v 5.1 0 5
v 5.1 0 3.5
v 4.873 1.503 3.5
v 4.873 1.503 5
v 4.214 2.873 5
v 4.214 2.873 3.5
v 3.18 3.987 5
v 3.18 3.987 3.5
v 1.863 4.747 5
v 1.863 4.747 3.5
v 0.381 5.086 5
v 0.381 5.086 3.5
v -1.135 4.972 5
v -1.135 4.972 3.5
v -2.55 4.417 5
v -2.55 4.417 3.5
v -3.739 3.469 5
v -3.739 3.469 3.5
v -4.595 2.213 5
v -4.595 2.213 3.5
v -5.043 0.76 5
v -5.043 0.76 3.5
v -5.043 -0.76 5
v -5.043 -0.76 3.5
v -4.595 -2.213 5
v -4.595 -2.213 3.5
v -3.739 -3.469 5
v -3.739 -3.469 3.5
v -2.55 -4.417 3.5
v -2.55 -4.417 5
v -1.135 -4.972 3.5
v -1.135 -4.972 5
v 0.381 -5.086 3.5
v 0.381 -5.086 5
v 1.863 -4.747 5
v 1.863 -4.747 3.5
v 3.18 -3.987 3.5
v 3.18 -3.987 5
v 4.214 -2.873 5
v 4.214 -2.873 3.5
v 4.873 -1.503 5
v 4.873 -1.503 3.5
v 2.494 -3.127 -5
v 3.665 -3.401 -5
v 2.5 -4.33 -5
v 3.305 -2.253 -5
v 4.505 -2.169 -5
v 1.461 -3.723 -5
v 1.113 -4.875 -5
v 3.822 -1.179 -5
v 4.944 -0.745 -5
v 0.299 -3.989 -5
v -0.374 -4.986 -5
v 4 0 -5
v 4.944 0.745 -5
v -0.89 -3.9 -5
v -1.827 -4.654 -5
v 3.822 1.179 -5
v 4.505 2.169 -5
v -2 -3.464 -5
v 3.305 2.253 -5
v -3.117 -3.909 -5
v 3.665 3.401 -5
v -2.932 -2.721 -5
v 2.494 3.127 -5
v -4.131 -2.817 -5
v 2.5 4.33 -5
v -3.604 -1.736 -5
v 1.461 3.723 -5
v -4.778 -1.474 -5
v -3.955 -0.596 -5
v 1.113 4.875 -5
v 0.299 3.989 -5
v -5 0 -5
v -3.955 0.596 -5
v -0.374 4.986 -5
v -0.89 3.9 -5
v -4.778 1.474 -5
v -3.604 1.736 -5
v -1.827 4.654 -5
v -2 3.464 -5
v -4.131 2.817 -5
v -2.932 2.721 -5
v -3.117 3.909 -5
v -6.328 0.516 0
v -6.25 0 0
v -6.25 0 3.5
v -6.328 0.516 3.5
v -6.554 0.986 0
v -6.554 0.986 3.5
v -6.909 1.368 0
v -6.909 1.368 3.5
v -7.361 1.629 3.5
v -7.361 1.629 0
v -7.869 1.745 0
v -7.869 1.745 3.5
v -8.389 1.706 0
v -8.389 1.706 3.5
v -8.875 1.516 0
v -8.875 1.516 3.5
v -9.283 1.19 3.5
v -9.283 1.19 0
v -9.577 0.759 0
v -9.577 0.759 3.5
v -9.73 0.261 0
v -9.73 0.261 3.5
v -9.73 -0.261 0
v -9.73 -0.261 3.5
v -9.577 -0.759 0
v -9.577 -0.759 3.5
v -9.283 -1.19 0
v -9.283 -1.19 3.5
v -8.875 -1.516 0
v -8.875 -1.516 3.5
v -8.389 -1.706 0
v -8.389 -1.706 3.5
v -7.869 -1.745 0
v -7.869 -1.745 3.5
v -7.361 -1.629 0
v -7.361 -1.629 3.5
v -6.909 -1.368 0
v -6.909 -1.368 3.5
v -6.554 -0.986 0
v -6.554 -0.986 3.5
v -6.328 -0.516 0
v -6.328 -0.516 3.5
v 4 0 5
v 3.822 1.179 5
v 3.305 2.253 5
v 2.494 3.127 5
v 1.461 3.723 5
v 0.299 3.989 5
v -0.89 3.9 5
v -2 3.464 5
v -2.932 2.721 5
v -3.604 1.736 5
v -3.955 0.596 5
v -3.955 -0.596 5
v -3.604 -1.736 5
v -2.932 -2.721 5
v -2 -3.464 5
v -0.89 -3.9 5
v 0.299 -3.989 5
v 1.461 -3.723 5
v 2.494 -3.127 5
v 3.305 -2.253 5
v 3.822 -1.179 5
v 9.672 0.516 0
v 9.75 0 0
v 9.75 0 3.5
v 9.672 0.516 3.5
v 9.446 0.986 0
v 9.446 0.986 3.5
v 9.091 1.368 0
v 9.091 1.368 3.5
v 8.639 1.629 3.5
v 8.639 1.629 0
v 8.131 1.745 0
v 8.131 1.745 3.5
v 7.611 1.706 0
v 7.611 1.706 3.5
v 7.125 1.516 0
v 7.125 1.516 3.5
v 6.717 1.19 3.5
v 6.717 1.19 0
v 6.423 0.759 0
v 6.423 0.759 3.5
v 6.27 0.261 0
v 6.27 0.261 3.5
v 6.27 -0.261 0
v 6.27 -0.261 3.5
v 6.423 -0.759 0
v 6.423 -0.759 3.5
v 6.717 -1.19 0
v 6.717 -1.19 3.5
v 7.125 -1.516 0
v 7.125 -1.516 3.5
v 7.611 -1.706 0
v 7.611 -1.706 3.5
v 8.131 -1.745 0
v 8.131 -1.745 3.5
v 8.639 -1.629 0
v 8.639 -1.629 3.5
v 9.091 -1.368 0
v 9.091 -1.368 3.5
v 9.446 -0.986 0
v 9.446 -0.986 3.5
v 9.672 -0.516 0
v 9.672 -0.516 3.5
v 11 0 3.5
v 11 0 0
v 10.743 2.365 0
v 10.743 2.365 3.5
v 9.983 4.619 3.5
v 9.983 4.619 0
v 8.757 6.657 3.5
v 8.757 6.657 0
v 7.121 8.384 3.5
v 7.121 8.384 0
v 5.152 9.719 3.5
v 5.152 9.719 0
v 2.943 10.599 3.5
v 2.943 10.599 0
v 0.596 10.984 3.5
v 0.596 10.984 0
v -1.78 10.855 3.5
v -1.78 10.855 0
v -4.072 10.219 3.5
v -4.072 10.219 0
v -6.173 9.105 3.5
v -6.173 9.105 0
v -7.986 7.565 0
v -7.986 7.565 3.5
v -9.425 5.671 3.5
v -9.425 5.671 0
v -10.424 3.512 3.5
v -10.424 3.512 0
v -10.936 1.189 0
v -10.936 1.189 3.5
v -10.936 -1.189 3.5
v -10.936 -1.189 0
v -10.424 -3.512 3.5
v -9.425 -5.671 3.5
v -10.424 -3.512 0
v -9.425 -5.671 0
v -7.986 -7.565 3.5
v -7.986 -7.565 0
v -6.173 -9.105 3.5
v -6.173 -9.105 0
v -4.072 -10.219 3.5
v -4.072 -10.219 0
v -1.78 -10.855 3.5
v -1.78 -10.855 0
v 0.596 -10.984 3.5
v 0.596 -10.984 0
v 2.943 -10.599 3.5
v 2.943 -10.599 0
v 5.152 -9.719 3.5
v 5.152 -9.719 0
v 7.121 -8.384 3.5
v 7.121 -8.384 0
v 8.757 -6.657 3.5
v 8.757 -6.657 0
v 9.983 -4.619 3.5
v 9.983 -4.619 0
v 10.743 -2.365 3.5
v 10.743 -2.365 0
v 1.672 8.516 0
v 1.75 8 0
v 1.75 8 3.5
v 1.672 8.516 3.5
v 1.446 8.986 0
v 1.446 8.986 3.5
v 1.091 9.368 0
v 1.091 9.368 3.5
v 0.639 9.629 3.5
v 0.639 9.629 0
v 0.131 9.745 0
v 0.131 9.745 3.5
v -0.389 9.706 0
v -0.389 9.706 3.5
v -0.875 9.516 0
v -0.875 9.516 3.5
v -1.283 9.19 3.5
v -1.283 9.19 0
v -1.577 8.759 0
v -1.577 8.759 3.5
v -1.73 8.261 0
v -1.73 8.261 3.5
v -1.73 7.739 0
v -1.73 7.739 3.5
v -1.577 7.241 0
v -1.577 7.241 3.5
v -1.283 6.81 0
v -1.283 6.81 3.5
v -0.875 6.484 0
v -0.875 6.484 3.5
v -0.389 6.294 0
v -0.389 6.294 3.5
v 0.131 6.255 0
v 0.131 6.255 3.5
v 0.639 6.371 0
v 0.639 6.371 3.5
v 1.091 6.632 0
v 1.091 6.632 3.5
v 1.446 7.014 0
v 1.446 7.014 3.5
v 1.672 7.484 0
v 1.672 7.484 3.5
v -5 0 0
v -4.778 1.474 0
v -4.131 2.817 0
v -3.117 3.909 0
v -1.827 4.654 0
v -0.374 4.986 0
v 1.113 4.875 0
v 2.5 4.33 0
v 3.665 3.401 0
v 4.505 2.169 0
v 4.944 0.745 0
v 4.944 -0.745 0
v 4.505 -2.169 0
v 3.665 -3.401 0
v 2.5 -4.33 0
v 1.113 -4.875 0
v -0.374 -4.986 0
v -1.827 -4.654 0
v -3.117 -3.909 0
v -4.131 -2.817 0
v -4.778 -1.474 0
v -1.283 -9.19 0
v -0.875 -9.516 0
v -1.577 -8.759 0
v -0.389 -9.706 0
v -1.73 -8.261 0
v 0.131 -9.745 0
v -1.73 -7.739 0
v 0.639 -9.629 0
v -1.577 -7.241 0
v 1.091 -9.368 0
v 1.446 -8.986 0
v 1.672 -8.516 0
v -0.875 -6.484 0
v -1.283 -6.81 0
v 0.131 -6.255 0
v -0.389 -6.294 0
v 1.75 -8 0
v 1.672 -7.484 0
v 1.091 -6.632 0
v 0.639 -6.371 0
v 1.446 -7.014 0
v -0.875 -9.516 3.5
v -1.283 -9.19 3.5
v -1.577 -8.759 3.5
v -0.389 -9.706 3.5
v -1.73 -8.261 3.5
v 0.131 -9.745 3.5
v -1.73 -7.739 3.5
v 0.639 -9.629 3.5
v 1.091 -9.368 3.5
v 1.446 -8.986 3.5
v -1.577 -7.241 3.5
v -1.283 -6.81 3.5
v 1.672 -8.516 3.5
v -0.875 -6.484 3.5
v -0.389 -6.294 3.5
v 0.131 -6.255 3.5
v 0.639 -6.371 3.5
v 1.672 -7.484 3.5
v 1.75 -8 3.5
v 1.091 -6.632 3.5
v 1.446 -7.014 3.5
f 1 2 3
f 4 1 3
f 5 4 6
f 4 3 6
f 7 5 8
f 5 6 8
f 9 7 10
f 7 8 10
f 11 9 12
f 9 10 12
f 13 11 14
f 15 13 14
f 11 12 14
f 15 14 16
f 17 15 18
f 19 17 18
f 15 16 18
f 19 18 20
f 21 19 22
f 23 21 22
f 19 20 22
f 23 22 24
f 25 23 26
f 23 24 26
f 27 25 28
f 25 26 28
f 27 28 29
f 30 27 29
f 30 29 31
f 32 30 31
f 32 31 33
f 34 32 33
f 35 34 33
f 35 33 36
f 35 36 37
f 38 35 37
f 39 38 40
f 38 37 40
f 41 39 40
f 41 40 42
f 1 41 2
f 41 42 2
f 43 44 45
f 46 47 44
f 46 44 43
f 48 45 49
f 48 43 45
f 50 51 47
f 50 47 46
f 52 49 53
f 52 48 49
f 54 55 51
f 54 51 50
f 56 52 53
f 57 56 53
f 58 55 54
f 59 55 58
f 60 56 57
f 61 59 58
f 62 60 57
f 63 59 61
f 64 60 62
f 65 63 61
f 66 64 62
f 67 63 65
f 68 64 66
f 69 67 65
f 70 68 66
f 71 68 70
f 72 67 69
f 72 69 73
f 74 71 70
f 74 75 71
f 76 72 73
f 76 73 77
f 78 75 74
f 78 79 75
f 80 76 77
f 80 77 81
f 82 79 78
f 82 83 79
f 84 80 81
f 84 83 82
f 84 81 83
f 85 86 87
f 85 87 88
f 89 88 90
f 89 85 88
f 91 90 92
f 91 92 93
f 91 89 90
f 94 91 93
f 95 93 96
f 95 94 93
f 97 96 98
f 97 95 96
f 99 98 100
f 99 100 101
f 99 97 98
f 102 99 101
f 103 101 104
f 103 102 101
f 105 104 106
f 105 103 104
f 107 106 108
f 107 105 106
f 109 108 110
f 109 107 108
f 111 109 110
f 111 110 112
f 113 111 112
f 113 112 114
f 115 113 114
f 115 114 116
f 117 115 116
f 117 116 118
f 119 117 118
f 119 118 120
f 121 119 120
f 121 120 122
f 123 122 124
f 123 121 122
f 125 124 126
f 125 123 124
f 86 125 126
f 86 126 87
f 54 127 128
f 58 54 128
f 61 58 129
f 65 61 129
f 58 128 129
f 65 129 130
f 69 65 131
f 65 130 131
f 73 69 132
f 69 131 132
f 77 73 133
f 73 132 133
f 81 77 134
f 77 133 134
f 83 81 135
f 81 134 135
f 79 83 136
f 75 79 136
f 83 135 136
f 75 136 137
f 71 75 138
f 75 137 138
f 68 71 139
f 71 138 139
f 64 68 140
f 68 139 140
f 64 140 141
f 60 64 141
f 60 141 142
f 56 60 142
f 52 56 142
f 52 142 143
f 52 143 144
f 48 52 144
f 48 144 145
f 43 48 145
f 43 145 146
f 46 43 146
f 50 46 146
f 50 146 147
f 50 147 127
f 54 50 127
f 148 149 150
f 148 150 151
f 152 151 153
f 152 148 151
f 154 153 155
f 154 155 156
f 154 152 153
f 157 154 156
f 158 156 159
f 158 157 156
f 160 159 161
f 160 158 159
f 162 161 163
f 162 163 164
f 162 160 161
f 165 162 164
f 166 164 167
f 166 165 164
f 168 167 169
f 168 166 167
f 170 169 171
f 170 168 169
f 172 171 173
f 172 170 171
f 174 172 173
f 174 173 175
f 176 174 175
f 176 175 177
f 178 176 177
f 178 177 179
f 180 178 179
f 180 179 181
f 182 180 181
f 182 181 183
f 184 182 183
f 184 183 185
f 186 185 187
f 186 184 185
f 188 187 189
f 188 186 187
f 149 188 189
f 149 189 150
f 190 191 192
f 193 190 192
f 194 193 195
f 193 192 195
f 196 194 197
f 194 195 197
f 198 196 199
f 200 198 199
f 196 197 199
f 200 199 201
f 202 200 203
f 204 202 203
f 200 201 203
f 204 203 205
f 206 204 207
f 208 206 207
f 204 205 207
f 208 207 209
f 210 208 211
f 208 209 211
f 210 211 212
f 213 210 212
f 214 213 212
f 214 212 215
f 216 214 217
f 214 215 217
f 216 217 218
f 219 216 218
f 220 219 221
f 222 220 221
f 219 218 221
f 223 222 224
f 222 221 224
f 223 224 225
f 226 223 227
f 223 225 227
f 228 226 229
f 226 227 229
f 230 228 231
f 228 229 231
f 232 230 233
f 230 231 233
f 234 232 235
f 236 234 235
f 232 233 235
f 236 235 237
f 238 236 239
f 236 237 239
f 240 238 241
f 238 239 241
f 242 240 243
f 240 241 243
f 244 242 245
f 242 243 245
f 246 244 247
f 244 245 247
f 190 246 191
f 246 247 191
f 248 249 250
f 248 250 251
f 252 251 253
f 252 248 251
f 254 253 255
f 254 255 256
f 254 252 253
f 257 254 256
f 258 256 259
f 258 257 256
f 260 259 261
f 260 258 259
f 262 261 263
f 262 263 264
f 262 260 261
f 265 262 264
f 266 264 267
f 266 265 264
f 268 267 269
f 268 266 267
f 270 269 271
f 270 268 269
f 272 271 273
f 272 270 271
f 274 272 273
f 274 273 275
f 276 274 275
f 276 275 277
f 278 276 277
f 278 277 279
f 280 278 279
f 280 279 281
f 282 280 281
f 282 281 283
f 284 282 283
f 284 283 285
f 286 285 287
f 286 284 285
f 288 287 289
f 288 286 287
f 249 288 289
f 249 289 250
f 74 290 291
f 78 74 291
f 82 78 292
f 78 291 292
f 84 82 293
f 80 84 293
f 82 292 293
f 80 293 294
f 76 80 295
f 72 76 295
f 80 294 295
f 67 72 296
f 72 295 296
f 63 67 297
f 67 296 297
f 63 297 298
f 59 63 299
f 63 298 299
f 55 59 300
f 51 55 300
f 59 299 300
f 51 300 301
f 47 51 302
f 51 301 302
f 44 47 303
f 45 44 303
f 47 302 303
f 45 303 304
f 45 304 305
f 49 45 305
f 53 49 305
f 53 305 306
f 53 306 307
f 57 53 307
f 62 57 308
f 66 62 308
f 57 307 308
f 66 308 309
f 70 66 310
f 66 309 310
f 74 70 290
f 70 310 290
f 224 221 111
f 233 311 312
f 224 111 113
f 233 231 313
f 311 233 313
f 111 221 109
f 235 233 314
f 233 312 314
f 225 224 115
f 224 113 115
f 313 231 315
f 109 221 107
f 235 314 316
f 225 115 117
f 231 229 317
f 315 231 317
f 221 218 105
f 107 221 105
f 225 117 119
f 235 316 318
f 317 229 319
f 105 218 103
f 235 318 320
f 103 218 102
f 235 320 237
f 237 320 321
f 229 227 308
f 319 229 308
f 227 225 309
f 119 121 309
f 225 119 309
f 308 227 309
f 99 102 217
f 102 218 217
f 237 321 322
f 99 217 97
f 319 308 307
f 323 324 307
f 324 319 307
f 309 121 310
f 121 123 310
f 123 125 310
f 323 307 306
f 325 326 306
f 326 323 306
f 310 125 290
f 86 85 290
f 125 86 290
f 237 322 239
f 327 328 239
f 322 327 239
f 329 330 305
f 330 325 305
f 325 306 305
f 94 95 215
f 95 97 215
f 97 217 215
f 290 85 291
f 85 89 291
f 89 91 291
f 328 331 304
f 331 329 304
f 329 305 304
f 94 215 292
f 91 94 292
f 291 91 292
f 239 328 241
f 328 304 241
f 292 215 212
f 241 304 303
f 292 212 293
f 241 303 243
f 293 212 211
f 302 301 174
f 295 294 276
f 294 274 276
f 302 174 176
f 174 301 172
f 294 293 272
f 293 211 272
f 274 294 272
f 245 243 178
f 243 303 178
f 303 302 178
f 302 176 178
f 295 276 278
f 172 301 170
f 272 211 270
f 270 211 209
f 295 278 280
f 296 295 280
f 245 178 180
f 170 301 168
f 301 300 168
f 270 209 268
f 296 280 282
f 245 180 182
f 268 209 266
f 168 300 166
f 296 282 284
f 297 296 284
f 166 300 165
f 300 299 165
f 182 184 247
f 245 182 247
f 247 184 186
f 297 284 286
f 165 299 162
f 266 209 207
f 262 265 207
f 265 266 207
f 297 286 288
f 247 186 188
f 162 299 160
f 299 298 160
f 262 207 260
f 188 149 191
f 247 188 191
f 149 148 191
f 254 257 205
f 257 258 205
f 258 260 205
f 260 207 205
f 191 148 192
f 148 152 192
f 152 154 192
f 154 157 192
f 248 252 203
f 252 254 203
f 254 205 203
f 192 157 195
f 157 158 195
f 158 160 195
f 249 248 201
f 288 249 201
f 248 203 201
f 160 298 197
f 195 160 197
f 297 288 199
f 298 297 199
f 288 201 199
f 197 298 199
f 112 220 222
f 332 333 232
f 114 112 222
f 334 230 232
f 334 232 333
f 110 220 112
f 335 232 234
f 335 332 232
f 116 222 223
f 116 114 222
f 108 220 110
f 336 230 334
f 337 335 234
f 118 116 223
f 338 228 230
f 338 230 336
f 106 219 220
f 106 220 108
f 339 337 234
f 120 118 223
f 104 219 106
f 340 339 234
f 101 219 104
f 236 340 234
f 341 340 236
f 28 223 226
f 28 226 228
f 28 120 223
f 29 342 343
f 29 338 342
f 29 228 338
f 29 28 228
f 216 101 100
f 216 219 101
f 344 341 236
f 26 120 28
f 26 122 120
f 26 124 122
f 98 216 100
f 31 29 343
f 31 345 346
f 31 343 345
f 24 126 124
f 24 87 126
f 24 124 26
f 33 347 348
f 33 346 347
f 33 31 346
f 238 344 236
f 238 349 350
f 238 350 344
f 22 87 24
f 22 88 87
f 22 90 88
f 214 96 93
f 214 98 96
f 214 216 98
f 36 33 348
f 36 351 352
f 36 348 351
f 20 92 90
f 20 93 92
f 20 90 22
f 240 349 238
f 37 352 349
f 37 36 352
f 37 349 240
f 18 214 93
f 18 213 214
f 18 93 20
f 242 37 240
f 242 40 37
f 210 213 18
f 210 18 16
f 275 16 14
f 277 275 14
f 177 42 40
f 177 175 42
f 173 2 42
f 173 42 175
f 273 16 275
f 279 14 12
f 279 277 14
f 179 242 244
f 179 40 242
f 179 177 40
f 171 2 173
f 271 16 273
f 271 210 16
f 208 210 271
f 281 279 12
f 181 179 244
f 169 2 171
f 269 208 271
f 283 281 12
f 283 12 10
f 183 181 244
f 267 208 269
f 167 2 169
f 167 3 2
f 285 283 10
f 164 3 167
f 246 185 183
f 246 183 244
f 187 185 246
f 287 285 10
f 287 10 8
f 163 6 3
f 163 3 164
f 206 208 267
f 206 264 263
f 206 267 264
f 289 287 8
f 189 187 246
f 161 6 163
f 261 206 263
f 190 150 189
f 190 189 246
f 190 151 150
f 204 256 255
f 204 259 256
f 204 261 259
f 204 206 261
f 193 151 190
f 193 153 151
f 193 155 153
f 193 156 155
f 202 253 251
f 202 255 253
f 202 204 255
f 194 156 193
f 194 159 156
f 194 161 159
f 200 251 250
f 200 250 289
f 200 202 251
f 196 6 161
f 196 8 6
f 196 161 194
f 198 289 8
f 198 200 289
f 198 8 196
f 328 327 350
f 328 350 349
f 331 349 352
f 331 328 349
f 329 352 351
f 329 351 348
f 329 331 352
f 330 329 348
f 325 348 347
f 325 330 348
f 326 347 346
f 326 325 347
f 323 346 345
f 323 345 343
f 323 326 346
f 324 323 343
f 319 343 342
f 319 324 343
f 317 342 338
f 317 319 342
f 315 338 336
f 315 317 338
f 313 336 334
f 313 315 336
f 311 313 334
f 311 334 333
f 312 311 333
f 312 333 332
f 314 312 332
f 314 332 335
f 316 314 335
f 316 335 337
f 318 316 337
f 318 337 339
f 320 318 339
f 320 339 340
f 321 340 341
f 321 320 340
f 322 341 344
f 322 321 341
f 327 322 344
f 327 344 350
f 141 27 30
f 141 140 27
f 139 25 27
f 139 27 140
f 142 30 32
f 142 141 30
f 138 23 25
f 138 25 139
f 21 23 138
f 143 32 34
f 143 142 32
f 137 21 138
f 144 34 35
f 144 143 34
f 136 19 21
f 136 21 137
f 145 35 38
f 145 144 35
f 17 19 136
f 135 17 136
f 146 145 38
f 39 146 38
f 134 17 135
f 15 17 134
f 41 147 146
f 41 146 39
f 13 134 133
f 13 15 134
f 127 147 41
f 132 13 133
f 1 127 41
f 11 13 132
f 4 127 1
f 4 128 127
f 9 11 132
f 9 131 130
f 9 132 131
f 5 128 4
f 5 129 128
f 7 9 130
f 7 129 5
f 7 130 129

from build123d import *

# Parameters (mm, degrees)
SKETCH_1_R          = 11
SKETCH_1_R_2        = 1.75
EXTRUDE_2_DEPTH     = 3.5
SKETCH_2_R          = 5.1
EXTRUDE_4_DEPTH     = 1.5
SKETCH_3_R          = 5
EXTRUDE_5_DEPTH     = 5
SKETCH_4_R          = 4
CUT_EXTRUDE_4_DEPTH = 11


with BuildPart() as part:
    # 草圖1 → 填料-伸長2 (new body)
    with BuildSketch(Plane.XY):
        Circle(SKETCH_1_R)
        with Locations((0, 8)):
            Circle(SKETCH_1_R_2, mode=Mode.SUBTRACT)
        with Locations((8, 0)):
            Circle(SKETCH_1_R_2, mode=Mode.SUBTRACT)
        with Locations((0, -8)):
            Circle(SKETCH_1_R_2, mode=Mode.SUBTRACT)
        with Locations((-8, 0)):
            Circle(SKETCH_1_R_2, mode=Mode.SUBTRACT)
    extrude(amount=EXTRUDE_2_DEPTH)

    # 草圖2 → 填料-伸長4 (add)
    with BuildSketch(Plane.XY.offset(3.5)):
        Circle(SKETCH_2_R)
    extrude(amount=EXTRUDE_4_DEPTH)

    # 草圖3 → 填料-伸長5 (add)
    with BuildSketch(Plane(origin=(0, 0, 0), x_dir=(-1, 0, 0), z_dir=(0, 0, -1))):
        Circle(SKETCH_3_R)
    extrude(amount=EXTRUDE_5_DEPTH)

    # 草圖4 → 除料-伸長4 (cut, through all)
    with BuildSketch(Plane.XY.offset(5)):
        Circle(SKETCH_4_R)
    extrude(amount=-CUT_EXTRUDE_4_DEPTH, mode=Mode.SUBTRACT)


solid = part.part
